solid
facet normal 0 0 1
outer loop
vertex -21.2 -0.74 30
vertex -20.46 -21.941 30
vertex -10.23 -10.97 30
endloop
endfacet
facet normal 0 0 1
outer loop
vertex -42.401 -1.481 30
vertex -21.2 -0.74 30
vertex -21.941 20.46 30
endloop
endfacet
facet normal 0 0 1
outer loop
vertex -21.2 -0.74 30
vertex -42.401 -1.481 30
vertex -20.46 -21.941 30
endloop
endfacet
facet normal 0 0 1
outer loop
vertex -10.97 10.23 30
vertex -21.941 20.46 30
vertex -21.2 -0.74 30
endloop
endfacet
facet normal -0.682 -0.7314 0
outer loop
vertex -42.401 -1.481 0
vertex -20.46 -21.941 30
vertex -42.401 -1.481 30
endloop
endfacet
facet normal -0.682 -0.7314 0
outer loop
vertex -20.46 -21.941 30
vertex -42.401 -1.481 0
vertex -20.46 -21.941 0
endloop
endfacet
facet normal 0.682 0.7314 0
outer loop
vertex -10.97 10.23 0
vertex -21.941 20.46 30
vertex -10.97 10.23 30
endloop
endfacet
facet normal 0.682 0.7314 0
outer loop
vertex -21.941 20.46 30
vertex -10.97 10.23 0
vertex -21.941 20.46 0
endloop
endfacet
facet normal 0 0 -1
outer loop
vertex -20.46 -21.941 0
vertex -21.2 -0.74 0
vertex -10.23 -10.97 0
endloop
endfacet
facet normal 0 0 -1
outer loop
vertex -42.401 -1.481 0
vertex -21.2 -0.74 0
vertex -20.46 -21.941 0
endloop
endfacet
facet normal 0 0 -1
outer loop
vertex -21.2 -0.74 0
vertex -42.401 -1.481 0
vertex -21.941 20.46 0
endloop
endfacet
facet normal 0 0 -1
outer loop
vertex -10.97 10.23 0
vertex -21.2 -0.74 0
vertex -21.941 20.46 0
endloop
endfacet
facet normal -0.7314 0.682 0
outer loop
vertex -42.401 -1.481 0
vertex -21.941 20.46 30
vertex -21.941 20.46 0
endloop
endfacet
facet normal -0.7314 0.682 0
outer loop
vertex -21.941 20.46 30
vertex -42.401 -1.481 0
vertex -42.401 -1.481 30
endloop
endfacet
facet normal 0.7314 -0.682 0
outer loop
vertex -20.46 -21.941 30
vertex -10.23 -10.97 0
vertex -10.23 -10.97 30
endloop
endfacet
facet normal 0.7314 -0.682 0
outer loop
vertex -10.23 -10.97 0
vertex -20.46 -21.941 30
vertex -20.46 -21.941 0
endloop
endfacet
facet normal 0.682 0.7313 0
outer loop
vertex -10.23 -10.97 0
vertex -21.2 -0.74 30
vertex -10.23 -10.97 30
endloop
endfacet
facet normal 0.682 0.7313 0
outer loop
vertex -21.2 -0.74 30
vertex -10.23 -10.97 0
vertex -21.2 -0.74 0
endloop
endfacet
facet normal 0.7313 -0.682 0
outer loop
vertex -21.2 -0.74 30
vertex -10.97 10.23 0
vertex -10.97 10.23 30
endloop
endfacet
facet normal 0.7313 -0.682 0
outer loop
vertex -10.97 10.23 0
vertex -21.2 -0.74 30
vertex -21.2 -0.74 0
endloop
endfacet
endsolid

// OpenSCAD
rotate([0,0,92])
rotate([0,-90,0]){
    difference(){
        rotate([-45,0,0]) {
            cube([30, 30, 30]);
        }
        scale([1,0.5,0.5]) {
            rotate([-45,0,0]) {
                cube([30, 30, 30]);
            }
        }
    }
}
